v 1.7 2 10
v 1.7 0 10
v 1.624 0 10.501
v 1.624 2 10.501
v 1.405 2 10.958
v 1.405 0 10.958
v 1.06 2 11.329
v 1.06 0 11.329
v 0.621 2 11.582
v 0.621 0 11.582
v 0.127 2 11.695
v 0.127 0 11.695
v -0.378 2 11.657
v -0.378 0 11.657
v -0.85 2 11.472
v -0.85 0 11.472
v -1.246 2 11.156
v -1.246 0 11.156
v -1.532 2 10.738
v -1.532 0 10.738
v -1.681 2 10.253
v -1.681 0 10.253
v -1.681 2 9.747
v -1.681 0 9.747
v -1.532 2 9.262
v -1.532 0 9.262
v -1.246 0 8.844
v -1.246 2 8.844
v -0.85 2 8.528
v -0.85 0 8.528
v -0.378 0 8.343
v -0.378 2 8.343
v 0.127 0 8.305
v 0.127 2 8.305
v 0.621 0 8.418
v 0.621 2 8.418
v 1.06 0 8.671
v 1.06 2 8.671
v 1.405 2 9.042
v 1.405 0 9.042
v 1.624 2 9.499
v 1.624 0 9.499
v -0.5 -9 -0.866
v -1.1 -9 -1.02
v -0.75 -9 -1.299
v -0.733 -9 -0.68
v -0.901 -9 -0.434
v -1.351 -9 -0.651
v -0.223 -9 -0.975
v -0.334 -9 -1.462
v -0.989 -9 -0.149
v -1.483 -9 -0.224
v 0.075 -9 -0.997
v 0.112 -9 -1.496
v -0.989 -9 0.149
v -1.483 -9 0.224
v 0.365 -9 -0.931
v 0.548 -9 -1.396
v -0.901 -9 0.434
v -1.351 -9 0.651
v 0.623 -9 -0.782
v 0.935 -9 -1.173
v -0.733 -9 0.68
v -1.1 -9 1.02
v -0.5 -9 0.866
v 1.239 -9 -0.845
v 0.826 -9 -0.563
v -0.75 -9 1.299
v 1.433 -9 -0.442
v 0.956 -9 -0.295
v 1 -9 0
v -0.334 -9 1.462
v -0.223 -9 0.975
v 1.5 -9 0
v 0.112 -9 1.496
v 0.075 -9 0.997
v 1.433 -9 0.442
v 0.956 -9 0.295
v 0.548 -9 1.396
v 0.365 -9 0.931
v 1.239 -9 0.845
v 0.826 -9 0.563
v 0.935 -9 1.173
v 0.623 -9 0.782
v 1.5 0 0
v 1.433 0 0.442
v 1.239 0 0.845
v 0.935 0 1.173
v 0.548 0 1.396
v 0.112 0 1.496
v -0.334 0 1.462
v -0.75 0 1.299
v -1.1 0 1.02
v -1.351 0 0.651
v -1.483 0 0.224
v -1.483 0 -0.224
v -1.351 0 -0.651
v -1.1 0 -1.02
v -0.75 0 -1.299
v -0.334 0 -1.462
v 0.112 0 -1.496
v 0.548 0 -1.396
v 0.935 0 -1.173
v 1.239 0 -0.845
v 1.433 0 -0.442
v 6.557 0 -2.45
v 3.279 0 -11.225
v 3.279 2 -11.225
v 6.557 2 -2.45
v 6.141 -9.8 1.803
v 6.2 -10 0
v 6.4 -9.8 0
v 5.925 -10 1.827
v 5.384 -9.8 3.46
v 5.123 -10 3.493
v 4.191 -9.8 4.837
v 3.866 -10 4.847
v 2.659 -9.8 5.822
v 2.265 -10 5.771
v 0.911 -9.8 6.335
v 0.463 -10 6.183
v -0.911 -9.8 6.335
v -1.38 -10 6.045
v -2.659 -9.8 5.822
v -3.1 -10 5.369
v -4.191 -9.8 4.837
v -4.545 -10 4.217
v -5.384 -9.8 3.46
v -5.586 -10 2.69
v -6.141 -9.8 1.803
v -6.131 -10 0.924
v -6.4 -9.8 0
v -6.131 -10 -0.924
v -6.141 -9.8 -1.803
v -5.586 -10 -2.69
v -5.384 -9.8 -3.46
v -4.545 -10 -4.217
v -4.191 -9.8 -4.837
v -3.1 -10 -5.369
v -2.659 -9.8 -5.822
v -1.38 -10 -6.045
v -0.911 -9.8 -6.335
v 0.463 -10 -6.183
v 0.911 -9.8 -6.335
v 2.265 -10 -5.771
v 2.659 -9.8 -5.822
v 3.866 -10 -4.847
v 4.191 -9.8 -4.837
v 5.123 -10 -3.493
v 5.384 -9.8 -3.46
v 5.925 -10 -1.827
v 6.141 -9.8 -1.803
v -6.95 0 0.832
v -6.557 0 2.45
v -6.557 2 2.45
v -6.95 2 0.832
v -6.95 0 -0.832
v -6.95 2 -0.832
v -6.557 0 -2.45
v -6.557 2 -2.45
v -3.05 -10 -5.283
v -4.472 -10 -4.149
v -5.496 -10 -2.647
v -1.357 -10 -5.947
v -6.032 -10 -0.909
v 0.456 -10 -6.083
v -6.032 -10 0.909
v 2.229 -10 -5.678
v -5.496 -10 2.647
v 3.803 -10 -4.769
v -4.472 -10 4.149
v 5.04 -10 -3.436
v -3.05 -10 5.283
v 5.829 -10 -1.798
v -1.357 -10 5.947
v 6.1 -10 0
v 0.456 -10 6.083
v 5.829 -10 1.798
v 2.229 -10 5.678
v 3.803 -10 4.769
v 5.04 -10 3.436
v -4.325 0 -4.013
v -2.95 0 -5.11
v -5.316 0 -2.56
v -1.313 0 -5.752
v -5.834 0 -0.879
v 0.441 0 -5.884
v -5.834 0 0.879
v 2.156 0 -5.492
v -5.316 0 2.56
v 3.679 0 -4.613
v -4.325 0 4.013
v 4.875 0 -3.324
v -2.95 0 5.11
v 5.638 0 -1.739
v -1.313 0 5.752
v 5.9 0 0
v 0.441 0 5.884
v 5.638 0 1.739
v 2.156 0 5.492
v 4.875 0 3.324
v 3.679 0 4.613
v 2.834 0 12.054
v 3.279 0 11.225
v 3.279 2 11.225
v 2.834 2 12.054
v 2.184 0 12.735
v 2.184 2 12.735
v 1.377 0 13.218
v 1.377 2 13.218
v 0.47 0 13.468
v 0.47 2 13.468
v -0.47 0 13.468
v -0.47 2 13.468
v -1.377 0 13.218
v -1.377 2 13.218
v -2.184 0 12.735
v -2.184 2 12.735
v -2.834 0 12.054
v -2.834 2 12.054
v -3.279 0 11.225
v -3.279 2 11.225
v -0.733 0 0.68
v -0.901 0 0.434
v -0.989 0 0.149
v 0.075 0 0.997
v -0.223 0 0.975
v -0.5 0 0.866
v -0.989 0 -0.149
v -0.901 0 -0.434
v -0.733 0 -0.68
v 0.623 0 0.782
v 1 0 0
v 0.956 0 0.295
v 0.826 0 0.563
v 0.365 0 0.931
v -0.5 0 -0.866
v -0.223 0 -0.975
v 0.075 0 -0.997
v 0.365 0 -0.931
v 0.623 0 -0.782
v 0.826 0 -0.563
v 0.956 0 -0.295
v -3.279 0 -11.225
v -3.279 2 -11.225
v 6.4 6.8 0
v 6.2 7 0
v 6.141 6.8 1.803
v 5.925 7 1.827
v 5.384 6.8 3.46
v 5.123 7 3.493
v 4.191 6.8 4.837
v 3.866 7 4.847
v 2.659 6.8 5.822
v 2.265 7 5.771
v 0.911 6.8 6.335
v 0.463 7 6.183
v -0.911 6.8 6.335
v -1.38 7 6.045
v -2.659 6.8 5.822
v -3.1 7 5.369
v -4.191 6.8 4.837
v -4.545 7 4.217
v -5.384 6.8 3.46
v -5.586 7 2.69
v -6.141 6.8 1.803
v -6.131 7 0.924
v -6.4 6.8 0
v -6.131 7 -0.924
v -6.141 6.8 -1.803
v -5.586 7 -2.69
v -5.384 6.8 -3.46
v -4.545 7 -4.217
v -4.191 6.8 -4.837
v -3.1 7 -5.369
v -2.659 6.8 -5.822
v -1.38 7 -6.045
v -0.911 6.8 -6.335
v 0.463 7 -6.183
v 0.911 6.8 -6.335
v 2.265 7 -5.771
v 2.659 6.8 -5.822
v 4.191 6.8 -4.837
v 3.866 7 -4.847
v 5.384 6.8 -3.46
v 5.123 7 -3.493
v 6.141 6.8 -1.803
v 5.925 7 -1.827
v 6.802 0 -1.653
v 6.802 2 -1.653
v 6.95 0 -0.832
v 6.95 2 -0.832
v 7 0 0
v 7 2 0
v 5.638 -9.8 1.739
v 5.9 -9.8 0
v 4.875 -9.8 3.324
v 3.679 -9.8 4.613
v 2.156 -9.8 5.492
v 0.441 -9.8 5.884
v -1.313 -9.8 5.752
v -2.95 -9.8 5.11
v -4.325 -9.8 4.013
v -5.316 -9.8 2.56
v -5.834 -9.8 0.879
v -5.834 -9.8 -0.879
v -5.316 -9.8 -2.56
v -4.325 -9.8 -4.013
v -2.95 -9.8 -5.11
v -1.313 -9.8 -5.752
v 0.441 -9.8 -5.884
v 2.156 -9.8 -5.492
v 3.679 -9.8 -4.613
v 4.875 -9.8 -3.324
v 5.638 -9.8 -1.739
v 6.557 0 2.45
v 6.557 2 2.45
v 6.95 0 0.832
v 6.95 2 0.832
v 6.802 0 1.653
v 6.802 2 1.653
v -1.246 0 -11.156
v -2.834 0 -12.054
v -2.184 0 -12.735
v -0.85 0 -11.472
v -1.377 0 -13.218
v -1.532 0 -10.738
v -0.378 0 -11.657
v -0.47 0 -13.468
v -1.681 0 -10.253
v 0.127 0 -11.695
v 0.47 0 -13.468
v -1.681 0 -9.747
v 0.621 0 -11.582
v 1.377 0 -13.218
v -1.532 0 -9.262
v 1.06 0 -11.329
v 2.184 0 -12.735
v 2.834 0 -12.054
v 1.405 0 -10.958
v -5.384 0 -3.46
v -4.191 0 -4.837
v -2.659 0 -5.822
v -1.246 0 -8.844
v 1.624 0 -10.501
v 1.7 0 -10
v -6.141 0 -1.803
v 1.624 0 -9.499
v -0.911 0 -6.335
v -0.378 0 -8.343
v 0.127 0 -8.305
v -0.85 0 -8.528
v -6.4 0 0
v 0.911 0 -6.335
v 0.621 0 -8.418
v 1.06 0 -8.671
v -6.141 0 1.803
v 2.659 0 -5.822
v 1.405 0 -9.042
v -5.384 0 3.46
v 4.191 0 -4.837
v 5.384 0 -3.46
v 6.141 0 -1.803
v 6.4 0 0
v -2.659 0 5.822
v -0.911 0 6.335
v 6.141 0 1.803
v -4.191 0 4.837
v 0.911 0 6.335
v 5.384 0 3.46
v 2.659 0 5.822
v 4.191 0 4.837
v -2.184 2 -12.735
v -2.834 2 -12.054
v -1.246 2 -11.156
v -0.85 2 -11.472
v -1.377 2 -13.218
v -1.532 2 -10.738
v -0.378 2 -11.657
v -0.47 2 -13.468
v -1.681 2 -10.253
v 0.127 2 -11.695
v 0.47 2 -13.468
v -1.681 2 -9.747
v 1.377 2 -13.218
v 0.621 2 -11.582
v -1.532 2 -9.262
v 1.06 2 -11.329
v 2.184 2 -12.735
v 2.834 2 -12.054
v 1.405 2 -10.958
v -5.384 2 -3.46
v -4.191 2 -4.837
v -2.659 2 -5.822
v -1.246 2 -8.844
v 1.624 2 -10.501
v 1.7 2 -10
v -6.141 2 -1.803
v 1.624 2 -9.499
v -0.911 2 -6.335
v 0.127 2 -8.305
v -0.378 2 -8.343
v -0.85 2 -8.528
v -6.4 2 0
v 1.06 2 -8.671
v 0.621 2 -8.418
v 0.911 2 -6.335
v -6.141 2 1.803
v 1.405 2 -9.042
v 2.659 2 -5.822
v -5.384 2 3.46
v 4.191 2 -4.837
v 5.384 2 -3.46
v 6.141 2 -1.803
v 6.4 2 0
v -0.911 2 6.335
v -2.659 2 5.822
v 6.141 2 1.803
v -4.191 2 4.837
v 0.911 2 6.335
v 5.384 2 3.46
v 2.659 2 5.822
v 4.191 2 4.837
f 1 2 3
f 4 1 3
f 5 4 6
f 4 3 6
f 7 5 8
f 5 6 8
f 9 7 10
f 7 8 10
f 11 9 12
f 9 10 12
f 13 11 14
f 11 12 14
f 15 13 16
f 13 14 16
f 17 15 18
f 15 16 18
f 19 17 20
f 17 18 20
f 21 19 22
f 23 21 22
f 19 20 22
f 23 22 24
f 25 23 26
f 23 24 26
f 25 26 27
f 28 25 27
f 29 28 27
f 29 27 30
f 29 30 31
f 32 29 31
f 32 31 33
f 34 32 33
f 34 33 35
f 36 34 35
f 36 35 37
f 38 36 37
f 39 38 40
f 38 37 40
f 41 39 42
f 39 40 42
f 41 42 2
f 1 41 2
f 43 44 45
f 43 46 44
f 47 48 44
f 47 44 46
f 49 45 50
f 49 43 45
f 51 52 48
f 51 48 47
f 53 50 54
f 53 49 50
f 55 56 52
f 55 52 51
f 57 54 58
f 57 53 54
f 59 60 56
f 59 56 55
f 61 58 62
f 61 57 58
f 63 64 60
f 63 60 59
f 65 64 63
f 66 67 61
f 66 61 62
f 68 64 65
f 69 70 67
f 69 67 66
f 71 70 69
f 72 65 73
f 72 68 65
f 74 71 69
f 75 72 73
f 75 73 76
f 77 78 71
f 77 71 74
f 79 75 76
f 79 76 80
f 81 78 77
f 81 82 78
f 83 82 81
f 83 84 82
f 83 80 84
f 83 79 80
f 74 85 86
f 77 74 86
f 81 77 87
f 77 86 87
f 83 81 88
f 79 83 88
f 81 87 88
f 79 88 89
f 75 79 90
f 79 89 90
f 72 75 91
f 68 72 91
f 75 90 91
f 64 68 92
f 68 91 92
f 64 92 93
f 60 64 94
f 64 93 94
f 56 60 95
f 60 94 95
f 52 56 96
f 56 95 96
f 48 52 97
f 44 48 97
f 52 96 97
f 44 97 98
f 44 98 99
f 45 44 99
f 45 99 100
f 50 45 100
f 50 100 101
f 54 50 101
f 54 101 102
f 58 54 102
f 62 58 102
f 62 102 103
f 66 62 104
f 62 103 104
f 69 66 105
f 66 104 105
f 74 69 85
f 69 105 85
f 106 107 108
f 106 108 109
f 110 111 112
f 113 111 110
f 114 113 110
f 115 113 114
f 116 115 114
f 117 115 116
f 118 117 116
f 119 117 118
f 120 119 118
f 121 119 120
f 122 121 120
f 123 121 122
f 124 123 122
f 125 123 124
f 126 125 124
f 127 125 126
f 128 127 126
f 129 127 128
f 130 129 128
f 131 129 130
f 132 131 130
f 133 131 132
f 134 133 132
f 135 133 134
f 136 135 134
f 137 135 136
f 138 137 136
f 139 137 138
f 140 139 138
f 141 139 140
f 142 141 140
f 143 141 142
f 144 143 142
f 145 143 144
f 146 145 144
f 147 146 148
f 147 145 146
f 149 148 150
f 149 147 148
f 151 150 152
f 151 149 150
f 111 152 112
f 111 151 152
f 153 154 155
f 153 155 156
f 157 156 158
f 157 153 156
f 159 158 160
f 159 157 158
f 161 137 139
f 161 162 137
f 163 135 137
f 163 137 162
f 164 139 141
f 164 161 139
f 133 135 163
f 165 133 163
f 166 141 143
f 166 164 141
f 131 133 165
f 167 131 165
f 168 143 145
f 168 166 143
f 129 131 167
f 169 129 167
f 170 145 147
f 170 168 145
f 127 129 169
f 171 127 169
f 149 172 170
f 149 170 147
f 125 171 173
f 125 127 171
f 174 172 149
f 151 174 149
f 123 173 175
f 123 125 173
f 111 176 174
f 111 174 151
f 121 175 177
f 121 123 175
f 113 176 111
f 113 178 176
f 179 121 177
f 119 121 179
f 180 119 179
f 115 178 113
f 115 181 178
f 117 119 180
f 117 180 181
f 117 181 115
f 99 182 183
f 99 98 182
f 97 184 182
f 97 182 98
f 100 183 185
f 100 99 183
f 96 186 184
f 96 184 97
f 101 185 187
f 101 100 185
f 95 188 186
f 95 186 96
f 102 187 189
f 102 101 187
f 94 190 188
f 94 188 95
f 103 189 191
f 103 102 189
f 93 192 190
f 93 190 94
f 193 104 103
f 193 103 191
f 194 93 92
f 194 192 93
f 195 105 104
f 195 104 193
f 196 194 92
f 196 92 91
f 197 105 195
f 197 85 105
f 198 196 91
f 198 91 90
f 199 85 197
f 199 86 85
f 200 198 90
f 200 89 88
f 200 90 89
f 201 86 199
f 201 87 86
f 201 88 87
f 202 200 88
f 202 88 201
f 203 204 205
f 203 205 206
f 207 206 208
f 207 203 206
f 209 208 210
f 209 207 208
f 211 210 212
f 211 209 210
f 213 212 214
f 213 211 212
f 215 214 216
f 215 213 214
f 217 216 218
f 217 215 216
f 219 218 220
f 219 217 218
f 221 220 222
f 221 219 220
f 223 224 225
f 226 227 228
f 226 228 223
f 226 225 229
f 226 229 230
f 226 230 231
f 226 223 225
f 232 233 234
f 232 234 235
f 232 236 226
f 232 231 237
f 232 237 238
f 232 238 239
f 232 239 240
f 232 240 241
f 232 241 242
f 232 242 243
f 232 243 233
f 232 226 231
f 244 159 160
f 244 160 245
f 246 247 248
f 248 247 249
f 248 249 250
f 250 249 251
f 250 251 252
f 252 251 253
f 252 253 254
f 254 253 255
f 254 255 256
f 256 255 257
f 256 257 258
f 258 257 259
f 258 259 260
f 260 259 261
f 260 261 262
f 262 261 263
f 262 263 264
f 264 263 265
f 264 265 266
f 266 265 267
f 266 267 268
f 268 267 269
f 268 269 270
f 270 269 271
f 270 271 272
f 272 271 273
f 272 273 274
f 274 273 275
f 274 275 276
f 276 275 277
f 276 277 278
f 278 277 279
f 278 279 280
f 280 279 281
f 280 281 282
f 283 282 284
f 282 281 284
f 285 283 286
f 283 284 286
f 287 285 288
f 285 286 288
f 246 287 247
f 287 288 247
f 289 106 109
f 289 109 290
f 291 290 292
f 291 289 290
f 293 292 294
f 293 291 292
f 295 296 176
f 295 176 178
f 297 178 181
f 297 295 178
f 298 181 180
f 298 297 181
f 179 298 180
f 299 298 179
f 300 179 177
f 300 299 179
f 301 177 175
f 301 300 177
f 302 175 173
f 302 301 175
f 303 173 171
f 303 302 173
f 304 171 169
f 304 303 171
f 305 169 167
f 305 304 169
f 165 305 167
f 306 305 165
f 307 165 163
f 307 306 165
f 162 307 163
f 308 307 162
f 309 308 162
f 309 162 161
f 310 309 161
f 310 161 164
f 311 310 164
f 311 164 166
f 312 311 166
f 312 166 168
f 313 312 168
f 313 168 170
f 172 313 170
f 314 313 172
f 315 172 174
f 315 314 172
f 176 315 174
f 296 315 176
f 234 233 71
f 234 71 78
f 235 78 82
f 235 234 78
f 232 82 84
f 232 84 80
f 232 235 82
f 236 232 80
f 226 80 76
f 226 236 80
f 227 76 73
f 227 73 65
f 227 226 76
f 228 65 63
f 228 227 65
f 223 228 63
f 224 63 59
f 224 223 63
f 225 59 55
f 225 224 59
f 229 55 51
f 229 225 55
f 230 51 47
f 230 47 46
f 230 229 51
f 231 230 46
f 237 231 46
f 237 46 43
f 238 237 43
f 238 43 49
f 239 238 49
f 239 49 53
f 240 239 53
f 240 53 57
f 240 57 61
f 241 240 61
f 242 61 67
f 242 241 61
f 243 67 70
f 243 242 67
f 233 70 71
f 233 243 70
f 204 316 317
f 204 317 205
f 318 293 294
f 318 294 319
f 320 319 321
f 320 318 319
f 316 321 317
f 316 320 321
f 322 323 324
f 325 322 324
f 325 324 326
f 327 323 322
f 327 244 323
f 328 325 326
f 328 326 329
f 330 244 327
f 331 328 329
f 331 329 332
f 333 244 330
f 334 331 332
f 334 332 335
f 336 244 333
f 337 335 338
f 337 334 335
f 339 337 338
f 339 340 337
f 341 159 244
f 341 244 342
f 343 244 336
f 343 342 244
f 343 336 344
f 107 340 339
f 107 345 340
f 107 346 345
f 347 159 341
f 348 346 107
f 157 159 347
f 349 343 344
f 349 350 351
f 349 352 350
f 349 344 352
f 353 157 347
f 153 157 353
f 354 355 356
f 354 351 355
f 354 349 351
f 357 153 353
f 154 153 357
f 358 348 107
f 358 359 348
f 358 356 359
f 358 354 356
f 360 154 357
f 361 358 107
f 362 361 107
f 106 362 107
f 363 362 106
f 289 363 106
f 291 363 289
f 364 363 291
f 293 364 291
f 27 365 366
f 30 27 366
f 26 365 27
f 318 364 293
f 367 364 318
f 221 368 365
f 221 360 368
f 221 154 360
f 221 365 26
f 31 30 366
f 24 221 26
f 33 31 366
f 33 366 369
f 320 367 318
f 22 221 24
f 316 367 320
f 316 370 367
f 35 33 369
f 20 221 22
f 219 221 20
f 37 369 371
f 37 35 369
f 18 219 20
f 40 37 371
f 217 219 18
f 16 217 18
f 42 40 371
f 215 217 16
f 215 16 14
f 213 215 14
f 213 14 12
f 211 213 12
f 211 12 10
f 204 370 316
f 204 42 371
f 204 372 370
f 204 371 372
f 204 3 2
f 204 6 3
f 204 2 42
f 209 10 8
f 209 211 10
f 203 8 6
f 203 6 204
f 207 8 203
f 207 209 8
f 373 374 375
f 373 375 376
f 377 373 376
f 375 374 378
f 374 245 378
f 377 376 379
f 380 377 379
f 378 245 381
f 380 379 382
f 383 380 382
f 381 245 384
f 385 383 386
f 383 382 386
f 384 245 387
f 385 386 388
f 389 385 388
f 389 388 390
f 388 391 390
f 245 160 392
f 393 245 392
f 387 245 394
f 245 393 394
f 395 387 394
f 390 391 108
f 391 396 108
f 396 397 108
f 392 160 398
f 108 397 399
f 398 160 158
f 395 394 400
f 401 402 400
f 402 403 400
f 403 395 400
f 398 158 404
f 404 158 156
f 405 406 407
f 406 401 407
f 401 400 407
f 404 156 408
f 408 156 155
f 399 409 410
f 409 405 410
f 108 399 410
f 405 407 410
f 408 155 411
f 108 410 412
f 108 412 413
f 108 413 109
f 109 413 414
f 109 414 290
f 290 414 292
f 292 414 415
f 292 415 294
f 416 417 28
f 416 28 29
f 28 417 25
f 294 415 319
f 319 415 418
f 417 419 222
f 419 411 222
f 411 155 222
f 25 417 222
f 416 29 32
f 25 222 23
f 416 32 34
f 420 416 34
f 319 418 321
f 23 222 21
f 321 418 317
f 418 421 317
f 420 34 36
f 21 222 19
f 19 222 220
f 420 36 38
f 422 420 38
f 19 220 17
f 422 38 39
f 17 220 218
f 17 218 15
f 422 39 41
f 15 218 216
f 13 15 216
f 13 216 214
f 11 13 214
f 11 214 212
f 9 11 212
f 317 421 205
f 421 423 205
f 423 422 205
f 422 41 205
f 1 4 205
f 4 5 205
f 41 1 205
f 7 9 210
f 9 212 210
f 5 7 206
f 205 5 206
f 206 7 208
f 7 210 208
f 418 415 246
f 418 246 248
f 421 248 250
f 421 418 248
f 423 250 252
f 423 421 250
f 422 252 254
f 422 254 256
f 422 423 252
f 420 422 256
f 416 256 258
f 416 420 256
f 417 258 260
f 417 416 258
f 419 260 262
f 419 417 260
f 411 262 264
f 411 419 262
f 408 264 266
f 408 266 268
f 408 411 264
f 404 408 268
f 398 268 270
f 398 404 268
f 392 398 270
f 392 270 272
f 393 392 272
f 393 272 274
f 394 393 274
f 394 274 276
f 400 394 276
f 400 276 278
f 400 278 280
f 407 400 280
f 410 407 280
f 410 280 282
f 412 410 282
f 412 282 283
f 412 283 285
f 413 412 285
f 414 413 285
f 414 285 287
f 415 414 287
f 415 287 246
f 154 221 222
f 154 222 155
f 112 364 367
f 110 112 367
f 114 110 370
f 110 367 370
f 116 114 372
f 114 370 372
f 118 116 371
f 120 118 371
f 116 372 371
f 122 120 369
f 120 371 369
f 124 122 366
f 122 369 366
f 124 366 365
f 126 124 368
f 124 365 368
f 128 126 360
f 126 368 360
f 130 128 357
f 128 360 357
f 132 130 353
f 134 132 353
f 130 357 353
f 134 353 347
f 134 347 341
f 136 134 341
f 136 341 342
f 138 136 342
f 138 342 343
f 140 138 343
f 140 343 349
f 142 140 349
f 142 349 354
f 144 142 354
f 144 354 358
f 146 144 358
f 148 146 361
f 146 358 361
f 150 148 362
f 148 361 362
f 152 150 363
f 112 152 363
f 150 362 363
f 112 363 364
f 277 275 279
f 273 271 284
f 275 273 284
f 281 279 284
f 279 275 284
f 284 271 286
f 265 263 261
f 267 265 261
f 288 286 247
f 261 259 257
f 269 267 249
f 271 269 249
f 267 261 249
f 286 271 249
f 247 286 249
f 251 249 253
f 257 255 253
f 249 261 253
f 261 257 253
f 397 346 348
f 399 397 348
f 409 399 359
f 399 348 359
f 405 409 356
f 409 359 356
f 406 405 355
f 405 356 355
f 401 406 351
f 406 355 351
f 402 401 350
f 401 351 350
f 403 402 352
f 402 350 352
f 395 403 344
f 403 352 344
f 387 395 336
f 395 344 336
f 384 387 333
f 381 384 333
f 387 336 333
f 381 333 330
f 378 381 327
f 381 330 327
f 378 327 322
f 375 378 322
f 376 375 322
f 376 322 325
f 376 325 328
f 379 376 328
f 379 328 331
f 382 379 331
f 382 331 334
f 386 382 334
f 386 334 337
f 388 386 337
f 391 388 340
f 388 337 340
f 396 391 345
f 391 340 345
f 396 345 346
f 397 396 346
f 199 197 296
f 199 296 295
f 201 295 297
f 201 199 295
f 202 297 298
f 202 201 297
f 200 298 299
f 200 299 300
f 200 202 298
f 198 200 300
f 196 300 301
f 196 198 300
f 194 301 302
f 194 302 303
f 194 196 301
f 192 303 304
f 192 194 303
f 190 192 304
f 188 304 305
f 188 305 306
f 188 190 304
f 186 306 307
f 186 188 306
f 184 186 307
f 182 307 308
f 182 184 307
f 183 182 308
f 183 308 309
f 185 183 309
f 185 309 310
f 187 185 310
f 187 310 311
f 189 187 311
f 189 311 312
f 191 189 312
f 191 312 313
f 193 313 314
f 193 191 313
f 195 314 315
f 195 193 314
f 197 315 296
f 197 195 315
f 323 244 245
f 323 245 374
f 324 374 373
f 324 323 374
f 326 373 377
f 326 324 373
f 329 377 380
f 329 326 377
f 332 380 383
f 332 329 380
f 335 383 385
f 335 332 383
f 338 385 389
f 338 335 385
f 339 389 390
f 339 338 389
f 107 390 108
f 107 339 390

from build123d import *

# Parameters (mm, degrees)
F0_R     = 1.7
F0_R_2   = 6.4
F0_R_3   = 5.9
F0_R_4   = 1.5
F0_R_5   = 1
F1_DEPTH = 2
F2_DEPTH = 7
F3_DEPTH = 10
F4_DEPTH = 9
F6_SIZE  = 0.2


# Not quite as in the source:
# - the program builds the solid bodies; features that only make, move or delete a surface that nothing else refers to are left out


with BuildPart() as f1:
    # F0 (on Front) → F1 (new body)
    with BuildSketch(Plane.XZ):
        with BuildLine():
            Line((6.5572478983, 2.45), (3.2786239492, 11.225))
            ThreePointArc((3.2786239492, 11.225), (0, 13.5), (-3.2786239492, 11.225))
            Line((-3.2786239492, 11.225), (-6.5572478983, 2.45))
            ThreePointArc((-6.5572478983, 2.45), (0, 7), (6.5572478983, 2.45))
        make_face()
        with Locations((0, 10)):
            Circle(F0_R, mode=Mode.SUBTRACT)
        with BuildLine():
            ThreePointArc((6.5572478983, -2.45), (0, -7), (-6.5572478983, -2.45))
            Line((-6.5572478983, -2.45), (-3.2786239492, -11.225))
            ThreePointArc((-3.2786239492, -11.225), (0, -13.5), (3.2786239492, -11.225))
            Line((3.2786239492, -11.225), (6.5572478983, -2.45))
        make_face()
        with Locations((0, -10)):
            Circle(F0_R, mode=Mode.SUBTRACT)
        with BuildLine():
            ThreePointArc((7, 0), (6.8884227254, 1.2448423016), (6.5572478983, 2.45))
            ThreePointArc((6.5572478983, 2.45), (0, 7), (-6.5572478983, 2.45))
            ThreePointArc((-6.5572478983, 2.45), (-7, 0), (-6.5572478983, -2.45))
            ThreePointArc((-6.5572478983, -2.45), (0, -7), (6.5572478983, -2.45))
            ThreePointArc((6.5572478983, -2.45), (6.8884227254, -1.2448423016), (7, 0))
        make_face()
        Circle(F0_R_2, mode=Mode.SUBTRACT)
        Circle(F0_R_2)
        Circle(F0_R_3, mode=Mode.SUBTRACT)
        Circle(F0_R_3)
        Circle(F0_R_4, mode=Mode.SUBTRACT)
        Circle(F0_R_4)
        Circle(F0_R_5, mode=Mode.SUBTRACT)
        Circle(F0_R_5)
    extrude(amount=-F1_DEPTH)

    # F0 (on Front) → F2 (join)
    with BuildSketch(Plane.XZ):
        Circle(F0_R_2)
        Circle(F0_R_3, mode=Mode.SUBTRACT)
        Circle(F0_R_3)
        Circle(F0_R_4, mode=Mode.SUBTRACT)
        Circle(F0_R_4)
        Circle(F0_R_5, mode=Mode.SUBTRACT)
        Circle(F0_R_5)
    extrude(amount=-F2_DEPTH)

    # F0 (on Front) → F3 (join)
    with BuildSketch(Plane.XZ):
        Circle(F0_R_2)
        Circle(F0_R_3, mode=Mode.SUBTRACT)
    extrude(amount=F3_DEPTH)

    # F0 (on Front) → F4 (join)
    with BuildSketch(Plane.XZ):
        Circle(F0_R_4)
        Circle(F0_R_5, mode=Mode.SUBTRACT)
    extrude(amount=F4_DEPTH)

    # F6
    f6_edges = [f1.edges().sort_by_distance(p)[0] for p in [
        (-6.4, -10, 0),
        (-5.9, -10, 0),
        (-6.4, 7, 0),
    ]]
    chamfer(f6_edges, length=F6_SIZE)


solid = f1.part
